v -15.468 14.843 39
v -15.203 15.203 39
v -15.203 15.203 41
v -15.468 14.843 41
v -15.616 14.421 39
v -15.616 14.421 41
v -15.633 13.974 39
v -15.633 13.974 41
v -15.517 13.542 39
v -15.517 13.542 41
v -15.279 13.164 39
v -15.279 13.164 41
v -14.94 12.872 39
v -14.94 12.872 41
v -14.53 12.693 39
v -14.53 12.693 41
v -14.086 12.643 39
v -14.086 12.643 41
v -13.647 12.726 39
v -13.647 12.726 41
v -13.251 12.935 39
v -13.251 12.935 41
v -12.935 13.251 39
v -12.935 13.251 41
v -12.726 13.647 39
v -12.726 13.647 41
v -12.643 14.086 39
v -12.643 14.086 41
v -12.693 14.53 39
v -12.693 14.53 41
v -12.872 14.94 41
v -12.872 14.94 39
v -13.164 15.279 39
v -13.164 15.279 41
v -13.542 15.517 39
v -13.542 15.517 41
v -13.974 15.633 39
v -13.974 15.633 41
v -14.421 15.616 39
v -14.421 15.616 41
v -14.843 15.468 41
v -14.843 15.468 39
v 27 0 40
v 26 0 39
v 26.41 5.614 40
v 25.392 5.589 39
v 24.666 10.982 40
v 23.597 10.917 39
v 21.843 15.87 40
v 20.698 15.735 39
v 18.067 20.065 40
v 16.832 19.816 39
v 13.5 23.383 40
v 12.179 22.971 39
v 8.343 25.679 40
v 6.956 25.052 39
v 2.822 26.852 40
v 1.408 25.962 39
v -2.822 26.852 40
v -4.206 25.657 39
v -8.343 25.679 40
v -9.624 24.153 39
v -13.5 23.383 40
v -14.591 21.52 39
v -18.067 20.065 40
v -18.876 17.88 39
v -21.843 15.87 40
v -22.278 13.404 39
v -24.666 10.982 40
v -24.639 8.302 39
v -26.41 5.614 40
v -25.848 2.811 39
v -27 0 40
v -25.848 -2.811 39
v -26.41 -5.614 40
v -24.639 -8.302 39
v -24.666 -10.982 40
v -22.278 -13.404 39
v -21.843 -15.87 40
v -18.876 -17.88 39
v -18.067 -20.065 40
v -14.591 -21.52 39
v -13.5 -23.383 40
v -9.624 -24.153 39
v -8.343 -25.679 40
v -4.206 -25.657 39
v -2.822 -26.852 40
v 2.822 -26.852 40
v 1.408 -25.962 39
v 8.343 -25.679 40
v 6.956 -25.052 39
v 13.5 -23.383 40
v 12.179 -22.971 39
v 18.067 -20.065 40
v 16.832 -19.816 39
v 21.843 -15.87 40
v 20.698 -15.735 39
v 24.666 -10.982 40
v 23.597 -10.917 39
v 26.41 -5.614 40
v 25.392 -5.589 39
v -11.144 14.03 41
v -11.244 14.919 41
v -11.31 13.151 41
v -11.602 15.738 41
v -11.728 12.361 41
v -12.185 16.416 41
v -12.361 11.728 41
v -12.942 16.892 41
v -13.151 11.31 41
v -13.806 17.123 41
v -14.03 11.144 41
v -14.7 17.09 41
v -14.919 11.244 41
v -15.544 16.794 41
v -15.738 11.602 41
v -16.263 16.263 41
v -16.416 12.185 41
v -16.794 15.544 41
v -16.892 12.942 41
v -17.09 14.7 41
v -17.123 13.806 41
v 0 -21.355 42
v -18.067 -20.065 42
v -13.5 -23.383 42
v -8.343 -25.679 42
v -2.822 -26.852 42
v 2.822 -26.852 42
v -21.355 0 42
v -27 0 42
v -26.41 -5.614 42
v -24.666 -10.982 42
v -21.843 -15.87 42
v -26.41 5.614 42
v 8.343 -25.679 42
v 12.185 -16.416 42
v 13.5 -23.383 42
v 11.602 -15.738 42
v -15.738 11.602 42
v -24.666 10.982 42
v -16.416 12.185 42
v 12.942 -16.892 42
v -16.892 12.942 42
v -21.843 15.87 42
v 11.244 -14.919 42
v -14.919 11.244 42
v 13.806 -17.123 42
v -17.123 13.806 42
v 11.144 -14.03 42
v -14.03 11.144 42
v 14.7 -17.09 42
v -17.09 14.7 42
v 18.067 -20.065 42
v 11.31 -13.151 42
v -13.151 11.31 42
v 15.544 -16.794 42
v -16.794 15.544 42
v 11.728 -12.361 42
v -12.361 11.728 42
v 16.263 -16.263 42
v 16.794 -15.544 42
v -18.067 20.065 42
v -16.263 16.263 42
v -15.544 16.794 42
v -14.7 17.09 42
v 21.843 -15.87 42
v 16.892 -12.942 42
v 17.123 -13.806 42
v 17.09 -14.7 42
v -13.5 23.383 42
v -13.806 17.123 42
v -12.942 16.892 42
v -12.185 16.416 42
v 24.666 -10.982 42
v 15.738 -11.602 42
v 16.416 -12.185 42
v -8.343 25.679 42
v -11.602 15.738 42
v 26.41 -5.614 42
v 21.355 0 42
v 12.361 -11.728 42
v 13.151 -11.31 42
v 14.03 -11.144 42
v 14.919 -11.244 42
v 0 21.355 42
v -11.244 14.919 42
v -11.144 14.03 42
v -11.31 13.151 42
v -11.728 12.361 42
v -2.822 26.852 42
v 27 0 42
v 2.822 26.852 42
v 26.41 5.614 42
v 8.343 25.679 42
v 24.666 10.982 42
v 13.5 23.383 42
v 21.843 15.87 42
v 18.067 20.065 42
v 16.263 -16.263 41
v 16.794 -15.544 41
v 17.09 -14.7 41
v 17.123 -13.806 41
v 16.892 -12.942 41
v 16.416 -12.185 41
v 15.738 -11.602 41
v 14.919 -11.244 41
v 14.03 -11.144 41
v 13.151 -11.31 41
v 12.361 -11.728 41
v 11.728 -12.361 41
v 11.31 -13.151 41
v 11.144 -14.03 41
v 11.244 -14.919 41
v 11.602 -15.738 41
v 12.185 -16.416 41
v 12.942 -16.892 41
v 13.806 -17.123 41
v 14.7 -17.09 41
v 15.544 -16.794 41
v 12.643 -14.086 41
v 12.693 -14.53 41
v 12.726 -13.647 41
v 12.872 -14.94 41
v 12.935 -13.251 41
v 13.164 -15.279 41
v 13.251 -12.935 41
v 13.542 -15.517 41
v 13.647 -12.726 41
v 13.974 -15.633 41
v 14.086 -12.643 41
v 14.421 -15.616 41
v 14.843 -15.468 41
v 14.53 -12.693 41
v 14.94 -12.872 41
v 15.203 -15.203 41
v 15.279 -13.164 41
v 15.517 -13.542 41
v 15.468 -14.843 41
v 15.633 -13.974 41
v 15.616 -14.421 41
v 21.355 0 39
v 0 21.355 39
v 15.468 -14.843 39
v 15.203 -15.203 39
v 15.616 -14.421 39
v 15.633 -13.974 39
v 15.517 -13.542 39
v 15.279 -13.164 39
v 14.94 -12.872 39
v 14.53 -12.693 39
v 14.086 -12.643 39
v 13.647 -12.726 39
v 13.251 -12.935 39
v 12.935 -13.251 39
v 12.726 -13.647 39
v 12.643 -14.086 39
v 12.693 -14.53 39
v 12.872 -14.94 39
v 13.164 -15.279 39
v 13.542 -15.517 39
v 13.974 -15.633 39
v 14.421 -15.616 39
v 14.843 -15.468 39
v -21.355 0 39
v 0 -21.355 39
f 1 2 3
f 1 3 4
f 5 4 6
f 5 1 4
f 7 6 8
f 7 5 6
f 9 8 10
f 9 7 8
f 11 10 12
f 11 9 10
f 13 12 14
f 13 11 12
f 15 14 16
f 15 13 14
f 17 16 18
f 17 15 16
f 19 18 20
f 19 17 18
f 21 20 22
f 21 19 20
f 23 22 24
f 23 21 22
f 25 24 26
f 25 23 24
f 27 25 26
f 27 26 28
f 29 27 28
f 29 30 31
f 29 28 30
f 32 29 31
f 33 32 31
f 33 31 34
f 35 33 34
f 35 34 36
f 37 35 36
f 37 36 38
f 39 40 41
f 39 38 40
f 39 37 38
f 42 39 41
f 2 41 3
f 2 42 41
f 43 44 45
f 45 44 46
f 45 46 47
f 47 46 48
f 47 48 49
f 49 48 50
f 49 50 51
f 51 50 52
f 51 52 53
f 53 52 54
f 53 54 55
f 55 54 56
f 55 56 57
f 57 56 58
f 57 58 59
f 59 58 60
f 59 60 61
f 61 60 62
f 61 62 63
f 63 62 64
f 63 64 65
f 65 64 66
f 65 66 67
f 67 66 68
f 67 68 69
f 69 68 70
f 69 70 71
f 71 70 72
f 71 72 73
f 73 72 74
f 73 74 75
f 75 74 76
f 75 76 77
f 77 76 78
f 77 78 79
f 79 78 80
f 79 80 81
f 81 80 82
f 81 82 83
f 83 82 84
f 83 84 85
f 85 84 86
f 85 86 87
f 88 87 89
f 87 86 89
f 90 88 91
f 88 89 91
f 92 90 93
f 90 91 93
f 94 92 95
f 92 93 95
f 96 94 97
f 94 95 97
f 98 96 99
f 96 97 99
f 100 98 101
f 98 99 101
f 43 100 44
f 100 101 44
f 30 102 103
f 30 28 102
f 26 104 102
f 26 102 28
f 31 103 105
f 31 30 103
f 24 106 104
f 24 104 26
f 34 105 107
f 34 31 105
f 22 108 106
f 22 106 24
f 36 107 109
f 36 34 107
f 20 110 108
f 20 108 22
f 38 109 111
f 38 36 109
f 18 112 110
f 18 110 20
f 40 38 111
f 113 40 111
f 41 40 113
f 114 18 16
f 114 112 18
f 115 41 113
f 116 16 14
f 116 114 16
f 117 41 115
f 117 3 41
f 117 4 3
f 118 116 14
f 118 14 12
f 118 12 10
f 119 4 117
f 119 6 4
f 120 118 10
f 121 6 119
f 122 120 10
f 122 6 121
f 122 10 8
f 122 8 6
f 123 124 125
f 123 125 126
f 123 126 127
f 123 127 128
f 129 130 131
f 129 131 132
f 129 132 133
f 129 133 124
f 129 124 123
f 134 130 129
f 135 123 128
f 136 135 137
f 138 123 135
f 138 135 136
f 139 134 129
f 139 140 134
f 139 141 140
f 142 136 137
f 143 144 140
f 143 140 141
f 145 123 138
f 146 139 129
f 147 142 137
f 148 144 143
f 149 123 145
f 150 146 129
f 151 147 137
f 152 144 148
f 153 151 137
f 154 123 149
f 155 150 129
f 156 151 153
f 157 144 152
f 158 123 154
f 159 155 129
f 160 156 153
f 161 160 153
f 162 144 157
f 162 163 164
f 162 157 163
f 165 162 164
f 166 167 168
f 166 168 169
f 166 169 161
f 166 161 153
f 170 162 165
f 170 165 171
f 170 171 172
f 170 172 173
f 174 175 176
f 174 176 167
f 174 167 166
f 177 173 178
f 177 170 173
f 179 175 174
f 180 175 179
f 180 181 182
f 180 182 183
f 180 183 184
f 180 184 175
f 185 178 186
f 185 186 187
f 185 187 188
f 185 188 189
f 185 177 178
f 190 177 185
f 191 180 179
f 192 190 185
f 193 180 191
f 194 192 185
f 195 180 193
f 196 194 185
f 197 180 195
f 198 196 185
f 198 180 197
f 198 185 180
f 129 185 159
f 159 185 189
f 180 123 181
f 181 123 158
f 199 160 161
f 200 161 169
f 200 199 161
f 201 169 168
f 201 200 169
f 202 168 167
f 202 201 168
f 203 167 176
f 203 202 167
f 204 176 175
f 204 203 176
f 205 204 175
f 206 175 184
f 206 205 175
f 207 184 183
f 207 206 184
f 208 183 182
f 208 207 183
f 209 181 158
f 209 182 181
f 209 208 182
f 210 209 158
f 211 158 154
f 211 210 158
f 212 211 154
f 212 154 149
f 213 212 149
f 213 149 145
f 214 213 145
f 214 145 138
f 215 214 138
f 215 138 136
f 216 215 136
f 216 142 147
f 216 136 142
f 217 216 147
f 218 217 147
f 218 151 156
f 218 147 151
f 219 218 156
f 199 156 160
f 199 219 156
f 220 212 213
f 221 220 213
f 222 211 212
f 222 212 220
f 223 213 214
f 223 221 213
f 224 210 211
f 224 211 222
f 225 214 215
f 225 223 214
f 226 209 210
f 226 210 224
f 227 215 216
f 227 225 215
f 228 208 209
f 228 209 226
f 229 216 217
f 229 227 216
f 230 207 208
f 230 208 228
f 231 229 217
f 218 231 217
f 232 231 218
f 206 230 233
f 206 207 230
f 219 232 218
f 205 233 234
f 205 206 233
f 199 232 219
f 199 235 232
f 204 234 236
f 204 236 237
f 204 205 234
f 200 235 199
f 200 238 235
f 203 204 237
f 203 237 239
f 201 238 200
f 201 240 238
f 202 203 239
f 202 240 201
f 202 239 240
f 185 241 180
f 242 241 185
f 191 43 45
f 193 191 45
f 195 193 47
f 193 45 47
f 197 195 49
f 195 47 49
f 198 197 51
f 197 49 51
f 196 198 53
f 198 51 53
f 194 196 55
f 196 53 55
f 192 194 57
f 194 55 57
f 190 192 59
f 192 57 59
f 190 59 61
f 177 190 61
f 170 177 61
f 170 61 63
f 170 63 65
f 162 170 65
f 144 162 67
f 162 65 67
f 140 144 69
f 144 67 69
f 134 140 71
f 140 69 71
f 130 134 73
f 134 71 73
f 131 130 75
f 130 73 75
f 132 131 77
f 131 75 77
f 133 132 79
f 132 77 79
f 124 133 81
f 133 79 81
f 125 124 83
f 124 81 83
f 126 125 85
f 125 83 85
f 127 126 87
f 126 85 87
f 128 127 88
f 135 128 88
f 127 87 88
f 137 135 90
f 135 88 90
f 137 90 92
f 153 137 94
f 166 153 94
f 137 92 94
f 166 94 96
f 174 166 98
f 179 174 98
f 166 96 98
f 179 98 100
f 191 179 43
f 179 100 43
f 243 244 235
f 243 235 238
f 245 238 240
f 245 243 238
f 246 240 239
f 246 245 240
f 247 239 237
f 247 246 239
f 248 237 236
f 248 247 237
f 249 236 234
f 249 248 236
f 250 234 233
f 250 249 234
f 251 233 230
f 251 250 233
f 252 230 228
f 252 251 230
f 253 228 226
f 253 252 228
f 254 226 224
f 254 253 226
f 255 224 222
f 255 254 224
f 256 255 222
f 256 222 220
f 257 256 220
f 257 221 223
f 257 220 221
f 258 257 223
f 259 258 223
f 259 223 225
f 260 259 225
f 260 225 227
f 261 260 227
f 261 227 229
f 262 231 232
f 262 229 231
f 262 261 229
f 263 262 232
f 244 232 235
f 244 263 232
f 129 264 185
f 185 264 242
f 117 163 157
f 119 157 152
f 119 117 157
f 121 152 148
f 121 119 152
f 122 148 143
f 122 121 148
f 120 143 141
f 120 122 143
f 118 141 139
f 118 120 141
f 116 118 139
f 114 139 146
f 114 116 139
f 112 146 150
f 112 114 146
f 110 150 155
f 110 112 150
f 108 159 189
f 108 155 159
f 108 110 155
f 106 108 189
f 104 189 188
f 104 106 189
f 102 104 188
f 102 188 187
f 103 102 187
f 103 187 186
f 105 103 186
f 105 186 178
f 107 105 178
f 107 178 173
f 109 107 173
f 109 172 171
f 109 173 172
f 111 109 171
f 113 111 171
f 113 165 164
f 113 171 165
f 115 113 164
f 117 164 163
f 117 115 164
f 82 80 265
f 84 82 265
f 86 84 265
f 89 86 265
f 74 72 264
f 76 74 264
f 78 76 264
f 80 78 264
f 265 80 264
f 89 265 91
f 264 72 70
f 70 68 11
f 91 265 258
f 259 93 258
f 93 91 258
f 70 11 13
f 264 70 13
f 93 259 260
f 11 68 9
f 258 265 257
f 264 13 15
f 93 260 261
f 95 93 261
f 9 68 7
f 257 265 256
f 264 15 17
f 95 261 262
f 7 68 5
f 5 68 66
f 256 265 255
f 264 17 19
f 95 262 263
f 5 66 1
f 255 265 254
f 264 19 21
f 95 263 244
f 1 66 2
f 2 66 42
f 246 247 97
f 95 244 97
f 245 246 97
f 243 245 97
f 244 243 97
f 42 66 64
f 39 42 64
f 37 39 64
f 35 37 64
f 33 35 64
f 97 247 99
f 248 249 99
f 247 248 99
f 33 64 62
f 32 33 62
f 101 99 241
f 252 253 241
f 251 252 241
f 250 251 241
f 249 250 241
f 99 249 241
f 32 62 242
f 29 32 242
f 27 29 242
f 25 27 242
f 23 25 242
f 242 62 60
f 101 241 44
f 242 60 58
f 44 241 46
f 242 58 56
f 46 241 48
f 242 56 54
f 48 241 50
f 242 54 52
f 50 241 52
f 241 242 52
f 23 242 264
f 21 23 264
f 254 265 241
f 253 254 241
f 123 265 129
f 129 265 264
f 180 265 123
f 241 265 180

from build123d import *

# Parameters (mm, degrees)
CYLINDER814_R               = 1.5
CYLINDER814_DEPTH           = 20
CYLINDER814_PLACEMENT_ANGLE = 135
CYLINDER815_R               = 1.5
CYLINDER815_DEPTH           = 20
CYLINDER815_PLACEMENT_ANGLE = 45
CYLINDER812_R               = 3
CYLINDER812_DEPTH           = 3
CYLINDER812_PLACEMENT_ANGLE = 135
CYLINDER813_R               = 3
CYLINDER813_DEPTH           = 3
CYLINDER813_PLACEMENT_ANGLE = 45
BOX316_W                    = 30.2
BOX316_H                    = 30.2
BOX316_DEPTH                = 100
BOX316_PLACEMENT_ANGLE      = 45
CYLINDER806_R               = 27
CYLINDER806_DEPTH           = 3
CHAMFER001_SIZE             = 1


with BuildPart() as v_lec814:
    # Cylinder814 → Cylinder814 (new body)
    with BuildSketch(Plane.XY):
        Circle(CYLINDER814_R)
    extrude(amount=CYLINDER814_DEPTH)


with BuildPart() as v_lec814_1:
    # Cylinder814 placement: moved
    add(v_lec814.part.moved(Location((-14.142136, 14.142136, -30))).rotate(Axis((-14.142136, 14.142136, -30), (0, 0, 1)), CYLINDER814_PLACEMENT_ANGLE))


with BuildPart() as compound724:
    # Cylinder815 → Cylinder815 (new body)
    with BuildSketch(Plane.XY):
        Circle(CYLINDER815_R)
    extrude(amount=CYLINDER815_DEPTH)


with BuildPart() as compound724_1:
    # Cylinder815 placement: moved
    add(compound724.part.moved(Location((14.142136, -14.142136, -30))).rotate(Axis((14.142136, -14.142136, -30), (0, 0, -1)), CYLINDER815_PLACEMENT_ANGLE))

    # Compound724: union Válec814
    add(v_lec814_1.part)


with BuildPart() as v_lec812:
    # Cylinder812 → Cylinder812 (new body)
    with BuildSketch(Plane.XY):
        Circle(CYLINDER812_R)
    extrude(amount=CYLINDER812_DEPTH)


with BuildPart() as v_lec812_1:
    # Cylinder812 placement: moved
    add(v_lec812.part.moved(Location((-14.142136, 14.142136, -30))).rotate(Axis((-14.142136, 14.142136, -30), (0, 0, 1)), CYLINDER812_PLACEMENT_ANGLE))


with BuildPart() as compound723:
    # Cylinder813 → Cylinder813 (new body)
    with BuildSketch(Plane.XY):
        Circle(CYLINDER813_R)
    extrude(amount=CYLINDER813_DEPTH)


with BuildPart() as compound723_1:
    # Cylinder813 placement: moved
    add(compound723.part.moved(Location((14.142136, -14.142136, -30))).rotate(Axis((14.142136, -14.142136, -30), (0, 0, -1)), CYLINDER813_PLACEMENT_ANGLE))

    # Compound723: union Válec812
    add(v_lec812_1.part)


with BuildPart() as compound723_2:
    # Compound723 placement: moved
    add(compound723_1.part.moved(Location((0, 0, 17))))


with BuildPart() as krychle316:
    # Box316 → Box316 (new body)
    with BuildSketch(Plane.XY):
        with Locations((15.1, 15.1)):
            Rectangle(BOX316_W, BOX316_H)
    extrude(amount=BOX316_DEPTH)


with BuildPart() as krychle316_1:
    # Box316 placement: moved
    add(krychle316.part.moved(Location((0, -21.354625, -30))).rotate(Axis((0, -21.354625, -30), (0, 0, 1)), BOX316_PLACEMENT_ANGLE))


with BuildPart() as g_midi_belt_wheel_front:
    # Cylinder806 → Cylinder806 (new body)
    with BuildSketch(Plane.XY.offset(-15)):
        Circle(CYLINDER806_R)
    extrude(amount=CYLINDER806_DEPTH)

    # Cut341: cut Krychle316
    add(krychle316_1.part, mode=Mode.SUBTRACT)

    # Chamfer001
    chamfer001_edges = [g_midi_belt_wheel_front.edges().sort_by_distance(p)[0] for p in [
        (-27, 0, -15),
    ]]
    chamfer(chamfer001_edges, length=CHAMFER001_SIZE)

    # Cut345: cut Compound723
    add(compound723_2.part, mode=Mode.SUBTRACT)

    # Cut346: cut Compound724
    add(compound724_1.part, mode=Mode.SUBTRACT)


with BuildPart() as g_midi_belt_wheel_front_1:
    # Cut346 placement: moved
    add(g_midi_belt_wheel_front.part.moved(Location((0, 0, 54))))


solid = g_midi_belt_wheel_front_1.part
